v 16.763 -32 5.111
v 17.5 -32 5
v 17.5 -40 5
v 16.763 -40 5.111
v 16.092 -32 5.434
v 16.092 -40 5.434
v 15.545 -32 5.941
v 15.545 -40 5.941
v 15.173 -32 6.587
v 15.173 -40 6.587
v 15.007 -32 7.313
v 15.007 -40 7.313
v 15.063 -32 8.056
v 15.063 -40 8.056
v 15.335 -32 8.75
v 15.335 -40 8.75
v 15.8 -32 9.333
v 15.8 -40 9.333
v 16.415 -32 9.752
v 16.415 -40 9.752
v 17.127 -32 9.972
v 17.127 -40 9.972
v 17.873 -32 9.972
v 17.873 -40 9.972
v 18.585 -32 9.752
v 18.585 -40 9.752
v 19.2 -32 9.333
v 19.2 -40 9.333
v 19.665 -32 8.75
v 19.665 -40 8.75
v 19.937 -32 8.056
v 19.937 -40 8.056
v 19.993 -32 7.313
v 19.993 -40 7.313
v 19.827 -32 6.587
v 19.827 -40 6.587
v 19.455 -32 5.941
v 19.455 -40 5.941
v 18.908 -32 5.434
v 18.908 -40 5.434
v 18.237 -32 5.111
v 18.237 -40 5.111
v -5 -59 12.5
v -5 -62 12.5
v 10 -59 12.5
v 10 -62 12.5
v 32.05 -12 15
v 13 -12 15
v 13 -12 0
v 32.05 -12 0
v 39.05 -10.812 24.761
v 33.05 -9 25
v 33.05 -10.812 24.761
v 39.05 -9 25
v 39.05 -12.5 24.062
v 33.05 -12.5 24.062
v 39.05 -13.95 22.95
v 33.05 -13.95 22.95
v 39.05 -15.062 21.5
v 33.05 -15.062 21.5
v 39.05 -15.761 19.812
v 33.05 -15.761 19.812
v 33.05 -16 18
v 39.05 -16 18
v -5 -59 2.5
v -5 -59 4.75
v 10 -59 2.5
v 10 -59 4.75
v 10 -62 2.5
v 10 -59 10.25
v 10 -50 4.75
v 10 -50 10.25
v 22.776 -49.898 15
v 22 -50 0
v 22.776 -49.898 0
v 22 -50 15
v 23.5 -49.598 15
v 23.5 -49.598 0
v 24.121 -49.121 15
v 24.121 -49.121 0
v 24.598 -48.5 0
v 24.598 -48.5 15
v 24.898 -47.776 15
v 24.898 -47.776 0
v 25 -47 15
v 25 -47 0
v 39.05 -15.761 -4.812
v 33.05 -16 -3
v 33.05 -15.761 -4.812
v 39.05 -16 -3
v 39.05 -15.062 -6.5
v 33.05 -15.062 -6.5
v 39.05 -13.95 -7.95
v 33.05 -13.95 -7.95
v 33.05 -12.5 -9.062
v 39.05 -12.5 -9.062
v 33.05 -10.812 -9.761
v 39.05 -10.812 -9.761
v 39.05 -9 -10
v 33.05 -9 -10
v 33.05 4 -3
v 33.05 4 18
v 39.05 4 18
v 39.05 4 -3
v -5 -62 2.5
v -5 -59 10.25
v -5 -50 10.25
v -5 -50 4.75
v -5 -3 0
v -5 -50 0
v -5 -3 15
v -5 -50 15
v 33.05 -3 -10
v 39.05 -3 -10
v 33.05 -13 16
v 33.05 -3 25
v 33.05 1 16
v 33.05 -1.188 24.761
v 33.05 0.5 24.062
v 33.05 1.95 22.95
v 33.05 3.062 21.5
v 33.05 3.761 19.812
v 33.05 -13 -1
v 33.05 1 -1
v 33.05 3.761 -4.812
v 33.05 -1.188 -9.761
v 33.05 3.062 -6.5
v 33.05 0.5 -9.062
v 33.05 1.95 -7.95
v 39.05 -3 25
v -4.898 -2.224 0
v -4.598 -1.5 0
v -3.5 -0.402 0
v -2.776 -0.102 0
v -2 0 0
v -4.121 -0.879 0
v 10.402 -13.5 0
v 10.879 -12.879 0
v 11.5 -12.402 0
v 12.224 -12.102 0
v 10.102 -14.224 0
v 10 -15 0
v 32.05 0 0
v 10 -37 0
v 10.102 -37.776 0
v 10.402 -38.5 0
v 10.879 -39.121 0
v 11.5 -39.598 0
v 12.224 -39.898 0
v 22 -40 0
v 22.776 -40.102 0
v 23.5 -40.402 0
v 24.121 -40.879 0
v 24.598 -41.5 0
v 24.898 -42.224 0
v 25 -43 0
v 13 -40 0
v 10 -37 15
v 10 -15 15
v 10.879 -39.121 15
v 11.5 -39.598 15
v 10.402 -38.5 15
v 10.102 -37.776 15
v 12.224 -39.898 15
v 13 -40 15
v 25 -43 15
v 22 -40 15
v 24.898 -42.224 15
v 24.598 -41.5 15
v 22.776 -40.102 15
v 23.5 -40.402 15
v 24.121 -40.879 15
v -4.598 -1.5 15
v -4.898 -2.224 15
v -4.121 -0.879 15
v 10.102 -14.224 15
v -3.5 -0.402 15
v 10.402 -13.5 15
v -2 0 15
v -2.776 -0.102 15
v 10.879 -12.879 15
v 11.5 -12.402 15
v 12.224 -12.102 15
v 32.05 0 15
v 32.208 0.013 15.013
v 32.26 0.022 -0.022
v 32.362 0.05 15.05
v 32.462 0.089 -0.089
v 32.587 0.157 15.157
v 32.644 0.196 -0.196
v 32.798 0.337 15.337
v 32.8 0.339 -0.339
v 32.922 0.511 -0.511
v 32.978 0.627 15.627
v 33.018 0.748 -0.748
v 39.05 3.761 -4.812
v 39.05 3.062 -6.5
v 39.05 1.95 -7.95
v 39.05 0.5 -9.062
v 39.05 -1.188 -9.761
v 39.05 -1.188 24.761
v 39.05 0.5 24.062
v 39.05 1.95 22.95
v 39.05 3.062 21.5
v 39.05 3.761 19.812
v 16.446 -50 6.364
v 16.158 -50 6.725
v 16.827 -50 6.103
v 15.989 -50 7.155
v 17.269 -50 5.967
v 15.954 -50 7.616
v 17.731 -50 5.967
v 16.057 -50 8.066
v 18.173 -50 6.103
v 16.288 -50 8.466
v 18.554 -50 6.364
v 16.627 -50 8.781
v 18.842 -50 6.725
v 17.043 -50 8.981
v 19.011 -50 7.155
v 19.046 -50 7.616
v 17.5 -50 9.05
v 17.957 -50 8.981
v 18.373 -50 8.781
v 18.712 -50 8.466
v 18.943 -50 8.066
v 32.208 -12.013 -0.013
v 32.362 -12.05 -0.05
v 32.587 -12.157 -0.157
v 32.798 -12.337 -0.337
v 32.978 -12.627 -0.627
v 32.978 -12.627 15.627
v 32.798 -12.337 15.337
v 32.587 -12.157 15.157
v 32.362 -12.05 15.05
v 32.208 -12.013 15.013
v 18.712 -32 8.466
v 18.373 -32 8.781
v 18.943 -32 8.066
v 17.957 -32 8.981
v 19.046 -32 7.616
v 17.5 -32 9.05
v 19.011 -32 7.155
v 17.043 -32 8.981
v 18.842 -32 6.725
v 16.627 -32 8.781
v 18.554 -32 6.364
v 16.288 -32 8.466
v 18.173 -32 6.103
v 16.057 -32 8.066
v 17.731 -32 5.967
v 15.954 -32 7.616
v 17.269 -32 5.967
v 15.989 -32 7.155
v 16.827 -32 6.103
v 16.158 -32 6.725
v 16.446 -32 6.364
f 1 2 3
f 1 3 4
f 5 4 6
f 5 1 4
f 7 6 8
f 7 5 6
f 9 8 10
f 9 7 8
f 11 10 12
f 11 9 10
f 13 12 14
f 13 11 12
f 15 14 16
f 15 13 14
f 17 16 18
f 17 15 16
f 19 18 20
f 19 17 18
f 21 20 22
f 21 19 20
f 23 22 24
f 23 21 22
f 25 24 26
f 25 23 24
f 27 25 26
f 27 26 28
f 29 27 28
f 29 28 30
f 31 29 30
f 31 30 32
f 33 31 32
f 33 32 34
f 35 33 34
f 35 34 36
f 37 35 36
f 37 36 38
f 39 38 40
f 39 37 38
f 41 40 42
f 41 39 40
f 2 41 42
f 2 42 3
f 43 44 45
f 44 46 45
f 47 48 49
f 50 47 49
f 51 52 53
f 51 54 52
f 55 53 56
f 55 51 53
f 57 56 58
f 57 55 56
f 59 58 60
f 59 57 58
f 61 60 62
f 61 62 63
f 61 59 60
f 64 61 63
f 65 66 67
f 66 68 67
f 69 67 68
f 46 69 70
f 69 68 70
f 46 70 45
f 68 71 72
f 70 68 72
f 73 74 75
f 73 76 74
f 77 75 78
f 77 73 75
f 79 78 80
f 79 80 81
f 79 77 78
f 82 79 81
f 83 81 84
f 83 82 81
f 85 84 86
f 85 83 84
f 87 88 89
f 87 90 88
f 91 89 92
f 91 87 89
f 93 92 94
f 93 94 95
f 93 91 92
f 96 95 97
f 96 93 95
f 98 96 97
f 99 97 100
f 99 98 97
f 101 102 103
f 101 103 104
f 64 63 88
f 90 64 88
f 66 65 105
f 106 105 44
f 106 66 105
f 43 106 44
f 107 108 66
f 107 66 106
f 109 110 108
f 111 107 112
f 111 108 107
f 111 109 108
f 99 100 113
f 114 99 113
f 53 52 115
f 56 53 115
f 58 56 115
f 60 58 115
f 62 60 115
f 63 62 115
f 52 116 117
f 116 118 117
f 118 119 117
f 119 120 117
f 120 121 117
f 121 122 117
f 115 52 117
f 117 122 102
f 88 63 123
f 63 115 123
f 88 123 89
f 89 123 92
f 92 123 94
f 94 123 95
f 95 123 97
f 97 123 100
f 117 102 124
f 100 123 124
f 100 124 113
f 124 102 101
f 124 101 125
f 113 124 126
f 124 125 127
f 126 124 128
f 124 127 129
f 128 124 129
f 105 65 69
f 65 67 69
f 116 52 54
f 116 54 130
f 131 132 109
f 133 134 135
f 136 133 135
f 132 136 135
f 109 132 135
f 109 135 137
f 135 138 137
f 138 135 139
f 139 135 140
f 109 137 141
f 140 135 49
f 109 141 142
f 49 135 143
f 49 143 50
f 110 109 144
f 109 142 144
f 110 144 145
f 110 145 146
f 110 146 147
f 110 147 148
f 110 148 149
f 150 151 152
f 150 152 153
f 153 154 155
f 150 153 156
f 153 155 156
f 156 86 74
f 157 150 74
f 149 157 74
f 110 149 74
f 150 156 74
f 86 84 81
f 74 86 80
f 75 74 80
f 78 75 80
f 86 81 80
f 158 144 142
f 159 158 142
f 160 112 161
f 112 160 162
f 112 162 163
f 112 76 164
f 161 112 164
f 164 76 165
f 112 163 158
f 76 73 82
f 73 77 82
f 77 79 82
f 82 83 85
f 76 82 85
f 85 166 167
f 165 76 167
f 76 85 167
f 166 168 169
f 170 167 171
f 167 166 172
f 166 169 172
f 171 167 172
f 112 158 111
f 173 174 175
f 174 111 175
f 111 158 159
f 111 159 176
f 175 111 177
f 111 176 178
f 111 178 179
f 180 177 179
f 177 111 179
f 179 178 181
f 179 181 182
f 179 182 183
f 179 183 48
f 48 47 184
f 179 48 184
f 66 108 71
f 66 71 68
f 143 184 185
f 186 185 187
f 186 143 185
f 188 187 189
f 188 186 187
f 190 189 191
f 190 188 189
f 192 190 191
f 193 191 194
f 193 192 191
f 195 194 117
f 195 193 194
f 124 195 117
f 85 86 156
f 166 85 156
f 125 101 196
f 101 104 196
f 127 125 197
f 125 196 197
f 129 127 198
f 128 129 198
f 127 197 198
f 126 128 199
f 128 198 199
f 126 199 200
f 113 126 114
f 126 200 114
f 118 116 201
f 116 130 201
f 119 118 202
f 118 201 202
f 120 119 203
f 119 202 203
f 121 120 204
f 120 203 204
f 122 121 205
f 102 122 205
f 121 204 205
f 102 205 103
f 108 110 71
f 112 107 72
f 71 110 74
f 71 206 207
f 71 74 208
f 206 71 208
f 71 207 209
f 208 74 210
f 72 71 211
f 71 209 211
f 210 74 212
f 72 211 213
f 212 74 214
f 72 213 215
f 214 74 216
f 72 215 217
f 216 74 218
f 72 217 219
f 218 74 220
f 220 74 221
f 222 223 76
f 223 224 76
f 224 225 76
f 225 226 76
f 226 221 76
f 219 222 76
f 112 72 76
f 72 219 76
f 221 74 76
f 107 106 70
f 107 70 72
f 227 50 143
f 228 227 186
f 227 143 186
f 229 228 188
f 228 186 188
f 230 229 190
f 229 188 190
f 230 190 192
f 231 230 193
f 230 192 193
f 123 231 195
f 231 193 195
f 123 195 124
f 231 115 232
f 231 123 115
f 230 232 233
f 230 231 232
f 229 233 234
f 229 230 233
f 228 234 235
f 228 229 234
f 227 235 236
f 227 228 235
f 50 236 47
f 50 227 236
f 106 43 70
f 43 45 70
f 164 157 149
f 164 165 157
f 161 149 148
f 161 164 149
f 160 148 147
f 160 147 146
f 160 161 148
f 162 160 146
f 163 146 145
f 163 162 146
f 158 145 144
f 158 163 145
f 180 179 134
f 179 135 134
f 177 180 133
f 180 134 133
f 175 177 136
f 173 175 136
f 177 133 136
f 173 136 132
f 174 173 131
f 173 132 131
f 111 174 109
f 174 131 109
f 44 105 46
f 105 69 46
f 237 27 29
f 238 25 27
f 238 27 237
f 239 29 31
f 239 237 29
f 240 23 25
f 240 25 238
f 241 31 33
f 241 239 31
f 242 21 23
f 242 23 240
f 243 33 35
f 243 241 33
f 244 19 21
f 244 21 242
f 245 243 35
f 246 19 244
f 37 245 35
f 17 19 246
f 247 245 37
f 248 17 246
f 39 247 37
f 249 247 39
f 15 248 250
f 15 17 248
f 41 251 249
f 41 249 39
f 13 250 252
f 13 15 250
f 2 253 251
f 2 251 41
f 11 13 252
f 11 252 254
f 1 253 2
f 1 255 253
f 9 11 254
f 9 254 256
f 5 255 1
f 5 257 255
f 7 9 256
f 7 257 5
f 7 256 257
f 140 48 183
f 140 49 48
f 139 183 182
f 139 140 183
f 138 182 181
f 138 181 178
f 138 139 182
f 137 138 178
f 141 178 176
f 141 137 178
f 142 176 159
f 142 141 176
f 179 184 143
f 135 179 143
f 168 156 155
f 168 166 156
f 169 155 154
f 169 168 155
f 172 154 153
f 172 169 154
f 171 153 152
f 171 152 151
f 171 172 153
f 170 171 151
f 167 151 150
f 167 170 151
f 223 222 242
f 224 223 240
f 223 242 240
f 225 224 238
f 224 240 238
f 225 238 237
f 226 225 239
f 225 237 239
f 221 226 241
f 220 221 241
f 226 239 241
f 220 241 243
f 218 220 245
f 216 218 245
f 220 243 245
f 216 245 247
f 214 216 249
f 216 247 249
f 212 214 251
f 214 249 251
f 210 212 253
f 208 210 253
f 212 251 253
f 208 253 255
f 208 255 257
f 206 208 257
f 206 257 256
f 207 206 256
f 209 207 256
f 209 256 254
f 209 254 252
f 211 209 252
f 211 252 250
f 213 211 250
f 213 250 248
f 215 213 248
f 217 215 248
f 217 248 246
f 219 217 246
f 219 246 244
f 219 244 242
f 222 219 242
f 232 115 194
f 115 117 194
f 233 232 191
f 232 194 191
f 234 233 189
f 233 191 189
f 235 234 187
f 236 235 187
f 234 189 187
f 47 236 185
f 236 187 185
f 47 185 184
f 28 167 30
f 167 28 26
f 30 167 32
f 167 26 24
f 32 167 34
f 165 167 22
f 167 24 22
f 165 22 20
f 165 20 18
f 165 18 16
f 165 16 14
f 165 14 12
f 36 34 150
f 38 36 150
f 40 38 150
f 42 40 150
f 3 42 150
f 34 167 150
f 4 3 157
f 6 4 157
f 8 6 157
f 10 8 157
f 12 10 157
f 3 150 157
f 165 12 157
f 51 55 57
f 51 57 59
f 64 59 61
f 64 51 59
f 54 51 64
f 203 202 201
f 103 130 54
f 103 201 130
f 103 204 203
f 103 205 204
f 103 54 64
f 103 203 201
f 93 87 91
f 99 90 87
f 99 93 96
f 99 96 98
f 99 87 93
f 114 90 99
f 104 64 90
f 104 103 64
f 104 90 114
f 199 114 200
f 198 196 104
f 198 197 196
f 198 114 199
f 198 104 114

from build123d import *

# Parameters (mm, degrees)
BOSS_EXTRUDE1_DEPTH = 15
BOSS_EXTRUDE2_DEPTH = 10
SKETCH3_R           = 1.55
CUT_EXTRUDE1_DEPTH  = 50.497474683
BOSS_EXTRUDE3_START = 8
SKETCH4_R           = 2.5
SKETCH4_R_2         = 1.55
BOSS_EXTRUDE3_DEPTH = 8
SKETCH5_W           = 15
SKETCH5_H           = 12
BOSS_EXTRUDE4_DEPTH = 23.05
BOSS_EXTRUDE5_DEPTH = 5
SKETCH9_W           = 35
SKETCH9_H           = 20
BOSS_EXTRUDE6_DEPTH = 6
FILLET1_R           = 7
FILLET4_R           = 3
FILLET6_R           = 1


with BuildPart() as part:
    # Sketch1 → Boss-Extrude1 (new body)
    with BuildSketch(Plane.XY):
        Polygon((0, 0), (0, -50), (25, -50), (25, -40), (10, -40), (10, 0), align=None)
    extrude(amount=BOSS_EXTRUDE1_DEPTH)

    # Sketch2 → Boss-Extrude2 (add)
    with BuildSketch(Plane.ZY):
        Polygon((10.25, -59), (10.25, -50), (4.75, -50), (4.75, -59), (2.5, -59), (2.5, -62), (6.725601587, -62), (8.274398413, -62), (12.5, -62), (12.5, -59), align=None)
    extrude(amount=-BOSS_EXTRUDE2_DEPTH)

    # Sketch3 → Cut-Extrude1 (cut, through all)
    with BuildSketch(Plane(origin=(0, -40, 0), x_dir=(1, 0, 0), z_dir=(0, 1, 0))):
        with Locations(Location((17.5, -7.5, 0), (0, 0, 270))):
            Circle(SKETCH3_R)
    extrude(amount=-CUT_EXTRUDE1_DEPTH, mode=Mode.SUBTRACT)

    # Sketch4 → Boss-Extrude3 (add)
    with BuildSketch(Plane(origin=(0, -40, 0), x_dir=(1, 0, 0), z_dir=(0, 1, 0)).offset(BOSS_EXTRUDE3_START)):
        with Locations(Location((17.5, -7.5, 0), (0, 0, 90))):
            Circle(SKETCH4_R)
        with Locations(Location((17.5, -7.5, 0), (0, 0, 270))):
            Circle(SKETCH4_R_2, mode=Mode.SUBTRACT)
    extrude(amount=-BOSS_EXTRUDE3_DEPTH)

    # Sketch5 → Boss-Extrude4 (add)
    with BuildSketch(Plane(origin=(10, 0, 0), x_dir=(0, 0, -1), z_dir=(1, 0, 0))):
        with Locations((-7.5, -6)):
            Rectangle(SKETCH5_W, SKETCH5_H)
    extrude(amount=BOSS_EXTRUDE4_DEPTH)

    # Sketch7 → Boss-Extrude5 (add)
    with BuildSketch(Plane.ZY):
        Polygon((0, 0), (0, -50), (4.75, -50), (4.75, -59), (2.5, -59), (2.5, -62), (12.5, -62), (12.5, -59), (10.25, -59), (10.25, -50), (15, -50), (15, 0), align=None)
    extrude(amount=BOSS_EXTRUDE5_DEPTH)

    # Sketch9 → Boss-Extrude6 (add)
    with BuildSketch(Plane(origin=(33.05, 0, 0), x_dir=(0, 0, -1), z_dir=(1, 0, 0))):
        with Locations((-7.5, -6)):
            Rectangle(SKETCH9_W, SKETCH9_H)
    extrude(amount=BOSS_EXTRUDE6_DEPTH)

    # Fillet1
    fillet1_edges = [part.edges().sort_by_distance(p)[0] for p in [
        (36.05, -16, -10),
        (36.05, 4, -10),
        (36.05, 4, 25),
        (36.05, -16, 25),
    ]]
    fillet(fillet1_edges, radius=FILLET1_R)

    # Fillet4
    fillet4_edges = [part.edges().sort_by_distance(p)[0] for p in [
        (10, -40, 7.5),
        (25, -40, 7.5),
        (25, -50, 7.5),
        (10, -12, 7.5),
        (-5, 0, 7.5),
    ]]
    fillet(fillet4_edges, radius=FILLET4_R)

    # Fillet6
    fillet6_edges = [part.edges().sort_by_distance(p)[0] for p in [
        (33.05, -6, 15),
        (33.05, -12, 7.5),
        (33.05, -6, 0),
        (33.05, 0, 7.5),
    ]]
    fillet(fillet6_edges, radius=FILLET6_R)


solid = part.part
